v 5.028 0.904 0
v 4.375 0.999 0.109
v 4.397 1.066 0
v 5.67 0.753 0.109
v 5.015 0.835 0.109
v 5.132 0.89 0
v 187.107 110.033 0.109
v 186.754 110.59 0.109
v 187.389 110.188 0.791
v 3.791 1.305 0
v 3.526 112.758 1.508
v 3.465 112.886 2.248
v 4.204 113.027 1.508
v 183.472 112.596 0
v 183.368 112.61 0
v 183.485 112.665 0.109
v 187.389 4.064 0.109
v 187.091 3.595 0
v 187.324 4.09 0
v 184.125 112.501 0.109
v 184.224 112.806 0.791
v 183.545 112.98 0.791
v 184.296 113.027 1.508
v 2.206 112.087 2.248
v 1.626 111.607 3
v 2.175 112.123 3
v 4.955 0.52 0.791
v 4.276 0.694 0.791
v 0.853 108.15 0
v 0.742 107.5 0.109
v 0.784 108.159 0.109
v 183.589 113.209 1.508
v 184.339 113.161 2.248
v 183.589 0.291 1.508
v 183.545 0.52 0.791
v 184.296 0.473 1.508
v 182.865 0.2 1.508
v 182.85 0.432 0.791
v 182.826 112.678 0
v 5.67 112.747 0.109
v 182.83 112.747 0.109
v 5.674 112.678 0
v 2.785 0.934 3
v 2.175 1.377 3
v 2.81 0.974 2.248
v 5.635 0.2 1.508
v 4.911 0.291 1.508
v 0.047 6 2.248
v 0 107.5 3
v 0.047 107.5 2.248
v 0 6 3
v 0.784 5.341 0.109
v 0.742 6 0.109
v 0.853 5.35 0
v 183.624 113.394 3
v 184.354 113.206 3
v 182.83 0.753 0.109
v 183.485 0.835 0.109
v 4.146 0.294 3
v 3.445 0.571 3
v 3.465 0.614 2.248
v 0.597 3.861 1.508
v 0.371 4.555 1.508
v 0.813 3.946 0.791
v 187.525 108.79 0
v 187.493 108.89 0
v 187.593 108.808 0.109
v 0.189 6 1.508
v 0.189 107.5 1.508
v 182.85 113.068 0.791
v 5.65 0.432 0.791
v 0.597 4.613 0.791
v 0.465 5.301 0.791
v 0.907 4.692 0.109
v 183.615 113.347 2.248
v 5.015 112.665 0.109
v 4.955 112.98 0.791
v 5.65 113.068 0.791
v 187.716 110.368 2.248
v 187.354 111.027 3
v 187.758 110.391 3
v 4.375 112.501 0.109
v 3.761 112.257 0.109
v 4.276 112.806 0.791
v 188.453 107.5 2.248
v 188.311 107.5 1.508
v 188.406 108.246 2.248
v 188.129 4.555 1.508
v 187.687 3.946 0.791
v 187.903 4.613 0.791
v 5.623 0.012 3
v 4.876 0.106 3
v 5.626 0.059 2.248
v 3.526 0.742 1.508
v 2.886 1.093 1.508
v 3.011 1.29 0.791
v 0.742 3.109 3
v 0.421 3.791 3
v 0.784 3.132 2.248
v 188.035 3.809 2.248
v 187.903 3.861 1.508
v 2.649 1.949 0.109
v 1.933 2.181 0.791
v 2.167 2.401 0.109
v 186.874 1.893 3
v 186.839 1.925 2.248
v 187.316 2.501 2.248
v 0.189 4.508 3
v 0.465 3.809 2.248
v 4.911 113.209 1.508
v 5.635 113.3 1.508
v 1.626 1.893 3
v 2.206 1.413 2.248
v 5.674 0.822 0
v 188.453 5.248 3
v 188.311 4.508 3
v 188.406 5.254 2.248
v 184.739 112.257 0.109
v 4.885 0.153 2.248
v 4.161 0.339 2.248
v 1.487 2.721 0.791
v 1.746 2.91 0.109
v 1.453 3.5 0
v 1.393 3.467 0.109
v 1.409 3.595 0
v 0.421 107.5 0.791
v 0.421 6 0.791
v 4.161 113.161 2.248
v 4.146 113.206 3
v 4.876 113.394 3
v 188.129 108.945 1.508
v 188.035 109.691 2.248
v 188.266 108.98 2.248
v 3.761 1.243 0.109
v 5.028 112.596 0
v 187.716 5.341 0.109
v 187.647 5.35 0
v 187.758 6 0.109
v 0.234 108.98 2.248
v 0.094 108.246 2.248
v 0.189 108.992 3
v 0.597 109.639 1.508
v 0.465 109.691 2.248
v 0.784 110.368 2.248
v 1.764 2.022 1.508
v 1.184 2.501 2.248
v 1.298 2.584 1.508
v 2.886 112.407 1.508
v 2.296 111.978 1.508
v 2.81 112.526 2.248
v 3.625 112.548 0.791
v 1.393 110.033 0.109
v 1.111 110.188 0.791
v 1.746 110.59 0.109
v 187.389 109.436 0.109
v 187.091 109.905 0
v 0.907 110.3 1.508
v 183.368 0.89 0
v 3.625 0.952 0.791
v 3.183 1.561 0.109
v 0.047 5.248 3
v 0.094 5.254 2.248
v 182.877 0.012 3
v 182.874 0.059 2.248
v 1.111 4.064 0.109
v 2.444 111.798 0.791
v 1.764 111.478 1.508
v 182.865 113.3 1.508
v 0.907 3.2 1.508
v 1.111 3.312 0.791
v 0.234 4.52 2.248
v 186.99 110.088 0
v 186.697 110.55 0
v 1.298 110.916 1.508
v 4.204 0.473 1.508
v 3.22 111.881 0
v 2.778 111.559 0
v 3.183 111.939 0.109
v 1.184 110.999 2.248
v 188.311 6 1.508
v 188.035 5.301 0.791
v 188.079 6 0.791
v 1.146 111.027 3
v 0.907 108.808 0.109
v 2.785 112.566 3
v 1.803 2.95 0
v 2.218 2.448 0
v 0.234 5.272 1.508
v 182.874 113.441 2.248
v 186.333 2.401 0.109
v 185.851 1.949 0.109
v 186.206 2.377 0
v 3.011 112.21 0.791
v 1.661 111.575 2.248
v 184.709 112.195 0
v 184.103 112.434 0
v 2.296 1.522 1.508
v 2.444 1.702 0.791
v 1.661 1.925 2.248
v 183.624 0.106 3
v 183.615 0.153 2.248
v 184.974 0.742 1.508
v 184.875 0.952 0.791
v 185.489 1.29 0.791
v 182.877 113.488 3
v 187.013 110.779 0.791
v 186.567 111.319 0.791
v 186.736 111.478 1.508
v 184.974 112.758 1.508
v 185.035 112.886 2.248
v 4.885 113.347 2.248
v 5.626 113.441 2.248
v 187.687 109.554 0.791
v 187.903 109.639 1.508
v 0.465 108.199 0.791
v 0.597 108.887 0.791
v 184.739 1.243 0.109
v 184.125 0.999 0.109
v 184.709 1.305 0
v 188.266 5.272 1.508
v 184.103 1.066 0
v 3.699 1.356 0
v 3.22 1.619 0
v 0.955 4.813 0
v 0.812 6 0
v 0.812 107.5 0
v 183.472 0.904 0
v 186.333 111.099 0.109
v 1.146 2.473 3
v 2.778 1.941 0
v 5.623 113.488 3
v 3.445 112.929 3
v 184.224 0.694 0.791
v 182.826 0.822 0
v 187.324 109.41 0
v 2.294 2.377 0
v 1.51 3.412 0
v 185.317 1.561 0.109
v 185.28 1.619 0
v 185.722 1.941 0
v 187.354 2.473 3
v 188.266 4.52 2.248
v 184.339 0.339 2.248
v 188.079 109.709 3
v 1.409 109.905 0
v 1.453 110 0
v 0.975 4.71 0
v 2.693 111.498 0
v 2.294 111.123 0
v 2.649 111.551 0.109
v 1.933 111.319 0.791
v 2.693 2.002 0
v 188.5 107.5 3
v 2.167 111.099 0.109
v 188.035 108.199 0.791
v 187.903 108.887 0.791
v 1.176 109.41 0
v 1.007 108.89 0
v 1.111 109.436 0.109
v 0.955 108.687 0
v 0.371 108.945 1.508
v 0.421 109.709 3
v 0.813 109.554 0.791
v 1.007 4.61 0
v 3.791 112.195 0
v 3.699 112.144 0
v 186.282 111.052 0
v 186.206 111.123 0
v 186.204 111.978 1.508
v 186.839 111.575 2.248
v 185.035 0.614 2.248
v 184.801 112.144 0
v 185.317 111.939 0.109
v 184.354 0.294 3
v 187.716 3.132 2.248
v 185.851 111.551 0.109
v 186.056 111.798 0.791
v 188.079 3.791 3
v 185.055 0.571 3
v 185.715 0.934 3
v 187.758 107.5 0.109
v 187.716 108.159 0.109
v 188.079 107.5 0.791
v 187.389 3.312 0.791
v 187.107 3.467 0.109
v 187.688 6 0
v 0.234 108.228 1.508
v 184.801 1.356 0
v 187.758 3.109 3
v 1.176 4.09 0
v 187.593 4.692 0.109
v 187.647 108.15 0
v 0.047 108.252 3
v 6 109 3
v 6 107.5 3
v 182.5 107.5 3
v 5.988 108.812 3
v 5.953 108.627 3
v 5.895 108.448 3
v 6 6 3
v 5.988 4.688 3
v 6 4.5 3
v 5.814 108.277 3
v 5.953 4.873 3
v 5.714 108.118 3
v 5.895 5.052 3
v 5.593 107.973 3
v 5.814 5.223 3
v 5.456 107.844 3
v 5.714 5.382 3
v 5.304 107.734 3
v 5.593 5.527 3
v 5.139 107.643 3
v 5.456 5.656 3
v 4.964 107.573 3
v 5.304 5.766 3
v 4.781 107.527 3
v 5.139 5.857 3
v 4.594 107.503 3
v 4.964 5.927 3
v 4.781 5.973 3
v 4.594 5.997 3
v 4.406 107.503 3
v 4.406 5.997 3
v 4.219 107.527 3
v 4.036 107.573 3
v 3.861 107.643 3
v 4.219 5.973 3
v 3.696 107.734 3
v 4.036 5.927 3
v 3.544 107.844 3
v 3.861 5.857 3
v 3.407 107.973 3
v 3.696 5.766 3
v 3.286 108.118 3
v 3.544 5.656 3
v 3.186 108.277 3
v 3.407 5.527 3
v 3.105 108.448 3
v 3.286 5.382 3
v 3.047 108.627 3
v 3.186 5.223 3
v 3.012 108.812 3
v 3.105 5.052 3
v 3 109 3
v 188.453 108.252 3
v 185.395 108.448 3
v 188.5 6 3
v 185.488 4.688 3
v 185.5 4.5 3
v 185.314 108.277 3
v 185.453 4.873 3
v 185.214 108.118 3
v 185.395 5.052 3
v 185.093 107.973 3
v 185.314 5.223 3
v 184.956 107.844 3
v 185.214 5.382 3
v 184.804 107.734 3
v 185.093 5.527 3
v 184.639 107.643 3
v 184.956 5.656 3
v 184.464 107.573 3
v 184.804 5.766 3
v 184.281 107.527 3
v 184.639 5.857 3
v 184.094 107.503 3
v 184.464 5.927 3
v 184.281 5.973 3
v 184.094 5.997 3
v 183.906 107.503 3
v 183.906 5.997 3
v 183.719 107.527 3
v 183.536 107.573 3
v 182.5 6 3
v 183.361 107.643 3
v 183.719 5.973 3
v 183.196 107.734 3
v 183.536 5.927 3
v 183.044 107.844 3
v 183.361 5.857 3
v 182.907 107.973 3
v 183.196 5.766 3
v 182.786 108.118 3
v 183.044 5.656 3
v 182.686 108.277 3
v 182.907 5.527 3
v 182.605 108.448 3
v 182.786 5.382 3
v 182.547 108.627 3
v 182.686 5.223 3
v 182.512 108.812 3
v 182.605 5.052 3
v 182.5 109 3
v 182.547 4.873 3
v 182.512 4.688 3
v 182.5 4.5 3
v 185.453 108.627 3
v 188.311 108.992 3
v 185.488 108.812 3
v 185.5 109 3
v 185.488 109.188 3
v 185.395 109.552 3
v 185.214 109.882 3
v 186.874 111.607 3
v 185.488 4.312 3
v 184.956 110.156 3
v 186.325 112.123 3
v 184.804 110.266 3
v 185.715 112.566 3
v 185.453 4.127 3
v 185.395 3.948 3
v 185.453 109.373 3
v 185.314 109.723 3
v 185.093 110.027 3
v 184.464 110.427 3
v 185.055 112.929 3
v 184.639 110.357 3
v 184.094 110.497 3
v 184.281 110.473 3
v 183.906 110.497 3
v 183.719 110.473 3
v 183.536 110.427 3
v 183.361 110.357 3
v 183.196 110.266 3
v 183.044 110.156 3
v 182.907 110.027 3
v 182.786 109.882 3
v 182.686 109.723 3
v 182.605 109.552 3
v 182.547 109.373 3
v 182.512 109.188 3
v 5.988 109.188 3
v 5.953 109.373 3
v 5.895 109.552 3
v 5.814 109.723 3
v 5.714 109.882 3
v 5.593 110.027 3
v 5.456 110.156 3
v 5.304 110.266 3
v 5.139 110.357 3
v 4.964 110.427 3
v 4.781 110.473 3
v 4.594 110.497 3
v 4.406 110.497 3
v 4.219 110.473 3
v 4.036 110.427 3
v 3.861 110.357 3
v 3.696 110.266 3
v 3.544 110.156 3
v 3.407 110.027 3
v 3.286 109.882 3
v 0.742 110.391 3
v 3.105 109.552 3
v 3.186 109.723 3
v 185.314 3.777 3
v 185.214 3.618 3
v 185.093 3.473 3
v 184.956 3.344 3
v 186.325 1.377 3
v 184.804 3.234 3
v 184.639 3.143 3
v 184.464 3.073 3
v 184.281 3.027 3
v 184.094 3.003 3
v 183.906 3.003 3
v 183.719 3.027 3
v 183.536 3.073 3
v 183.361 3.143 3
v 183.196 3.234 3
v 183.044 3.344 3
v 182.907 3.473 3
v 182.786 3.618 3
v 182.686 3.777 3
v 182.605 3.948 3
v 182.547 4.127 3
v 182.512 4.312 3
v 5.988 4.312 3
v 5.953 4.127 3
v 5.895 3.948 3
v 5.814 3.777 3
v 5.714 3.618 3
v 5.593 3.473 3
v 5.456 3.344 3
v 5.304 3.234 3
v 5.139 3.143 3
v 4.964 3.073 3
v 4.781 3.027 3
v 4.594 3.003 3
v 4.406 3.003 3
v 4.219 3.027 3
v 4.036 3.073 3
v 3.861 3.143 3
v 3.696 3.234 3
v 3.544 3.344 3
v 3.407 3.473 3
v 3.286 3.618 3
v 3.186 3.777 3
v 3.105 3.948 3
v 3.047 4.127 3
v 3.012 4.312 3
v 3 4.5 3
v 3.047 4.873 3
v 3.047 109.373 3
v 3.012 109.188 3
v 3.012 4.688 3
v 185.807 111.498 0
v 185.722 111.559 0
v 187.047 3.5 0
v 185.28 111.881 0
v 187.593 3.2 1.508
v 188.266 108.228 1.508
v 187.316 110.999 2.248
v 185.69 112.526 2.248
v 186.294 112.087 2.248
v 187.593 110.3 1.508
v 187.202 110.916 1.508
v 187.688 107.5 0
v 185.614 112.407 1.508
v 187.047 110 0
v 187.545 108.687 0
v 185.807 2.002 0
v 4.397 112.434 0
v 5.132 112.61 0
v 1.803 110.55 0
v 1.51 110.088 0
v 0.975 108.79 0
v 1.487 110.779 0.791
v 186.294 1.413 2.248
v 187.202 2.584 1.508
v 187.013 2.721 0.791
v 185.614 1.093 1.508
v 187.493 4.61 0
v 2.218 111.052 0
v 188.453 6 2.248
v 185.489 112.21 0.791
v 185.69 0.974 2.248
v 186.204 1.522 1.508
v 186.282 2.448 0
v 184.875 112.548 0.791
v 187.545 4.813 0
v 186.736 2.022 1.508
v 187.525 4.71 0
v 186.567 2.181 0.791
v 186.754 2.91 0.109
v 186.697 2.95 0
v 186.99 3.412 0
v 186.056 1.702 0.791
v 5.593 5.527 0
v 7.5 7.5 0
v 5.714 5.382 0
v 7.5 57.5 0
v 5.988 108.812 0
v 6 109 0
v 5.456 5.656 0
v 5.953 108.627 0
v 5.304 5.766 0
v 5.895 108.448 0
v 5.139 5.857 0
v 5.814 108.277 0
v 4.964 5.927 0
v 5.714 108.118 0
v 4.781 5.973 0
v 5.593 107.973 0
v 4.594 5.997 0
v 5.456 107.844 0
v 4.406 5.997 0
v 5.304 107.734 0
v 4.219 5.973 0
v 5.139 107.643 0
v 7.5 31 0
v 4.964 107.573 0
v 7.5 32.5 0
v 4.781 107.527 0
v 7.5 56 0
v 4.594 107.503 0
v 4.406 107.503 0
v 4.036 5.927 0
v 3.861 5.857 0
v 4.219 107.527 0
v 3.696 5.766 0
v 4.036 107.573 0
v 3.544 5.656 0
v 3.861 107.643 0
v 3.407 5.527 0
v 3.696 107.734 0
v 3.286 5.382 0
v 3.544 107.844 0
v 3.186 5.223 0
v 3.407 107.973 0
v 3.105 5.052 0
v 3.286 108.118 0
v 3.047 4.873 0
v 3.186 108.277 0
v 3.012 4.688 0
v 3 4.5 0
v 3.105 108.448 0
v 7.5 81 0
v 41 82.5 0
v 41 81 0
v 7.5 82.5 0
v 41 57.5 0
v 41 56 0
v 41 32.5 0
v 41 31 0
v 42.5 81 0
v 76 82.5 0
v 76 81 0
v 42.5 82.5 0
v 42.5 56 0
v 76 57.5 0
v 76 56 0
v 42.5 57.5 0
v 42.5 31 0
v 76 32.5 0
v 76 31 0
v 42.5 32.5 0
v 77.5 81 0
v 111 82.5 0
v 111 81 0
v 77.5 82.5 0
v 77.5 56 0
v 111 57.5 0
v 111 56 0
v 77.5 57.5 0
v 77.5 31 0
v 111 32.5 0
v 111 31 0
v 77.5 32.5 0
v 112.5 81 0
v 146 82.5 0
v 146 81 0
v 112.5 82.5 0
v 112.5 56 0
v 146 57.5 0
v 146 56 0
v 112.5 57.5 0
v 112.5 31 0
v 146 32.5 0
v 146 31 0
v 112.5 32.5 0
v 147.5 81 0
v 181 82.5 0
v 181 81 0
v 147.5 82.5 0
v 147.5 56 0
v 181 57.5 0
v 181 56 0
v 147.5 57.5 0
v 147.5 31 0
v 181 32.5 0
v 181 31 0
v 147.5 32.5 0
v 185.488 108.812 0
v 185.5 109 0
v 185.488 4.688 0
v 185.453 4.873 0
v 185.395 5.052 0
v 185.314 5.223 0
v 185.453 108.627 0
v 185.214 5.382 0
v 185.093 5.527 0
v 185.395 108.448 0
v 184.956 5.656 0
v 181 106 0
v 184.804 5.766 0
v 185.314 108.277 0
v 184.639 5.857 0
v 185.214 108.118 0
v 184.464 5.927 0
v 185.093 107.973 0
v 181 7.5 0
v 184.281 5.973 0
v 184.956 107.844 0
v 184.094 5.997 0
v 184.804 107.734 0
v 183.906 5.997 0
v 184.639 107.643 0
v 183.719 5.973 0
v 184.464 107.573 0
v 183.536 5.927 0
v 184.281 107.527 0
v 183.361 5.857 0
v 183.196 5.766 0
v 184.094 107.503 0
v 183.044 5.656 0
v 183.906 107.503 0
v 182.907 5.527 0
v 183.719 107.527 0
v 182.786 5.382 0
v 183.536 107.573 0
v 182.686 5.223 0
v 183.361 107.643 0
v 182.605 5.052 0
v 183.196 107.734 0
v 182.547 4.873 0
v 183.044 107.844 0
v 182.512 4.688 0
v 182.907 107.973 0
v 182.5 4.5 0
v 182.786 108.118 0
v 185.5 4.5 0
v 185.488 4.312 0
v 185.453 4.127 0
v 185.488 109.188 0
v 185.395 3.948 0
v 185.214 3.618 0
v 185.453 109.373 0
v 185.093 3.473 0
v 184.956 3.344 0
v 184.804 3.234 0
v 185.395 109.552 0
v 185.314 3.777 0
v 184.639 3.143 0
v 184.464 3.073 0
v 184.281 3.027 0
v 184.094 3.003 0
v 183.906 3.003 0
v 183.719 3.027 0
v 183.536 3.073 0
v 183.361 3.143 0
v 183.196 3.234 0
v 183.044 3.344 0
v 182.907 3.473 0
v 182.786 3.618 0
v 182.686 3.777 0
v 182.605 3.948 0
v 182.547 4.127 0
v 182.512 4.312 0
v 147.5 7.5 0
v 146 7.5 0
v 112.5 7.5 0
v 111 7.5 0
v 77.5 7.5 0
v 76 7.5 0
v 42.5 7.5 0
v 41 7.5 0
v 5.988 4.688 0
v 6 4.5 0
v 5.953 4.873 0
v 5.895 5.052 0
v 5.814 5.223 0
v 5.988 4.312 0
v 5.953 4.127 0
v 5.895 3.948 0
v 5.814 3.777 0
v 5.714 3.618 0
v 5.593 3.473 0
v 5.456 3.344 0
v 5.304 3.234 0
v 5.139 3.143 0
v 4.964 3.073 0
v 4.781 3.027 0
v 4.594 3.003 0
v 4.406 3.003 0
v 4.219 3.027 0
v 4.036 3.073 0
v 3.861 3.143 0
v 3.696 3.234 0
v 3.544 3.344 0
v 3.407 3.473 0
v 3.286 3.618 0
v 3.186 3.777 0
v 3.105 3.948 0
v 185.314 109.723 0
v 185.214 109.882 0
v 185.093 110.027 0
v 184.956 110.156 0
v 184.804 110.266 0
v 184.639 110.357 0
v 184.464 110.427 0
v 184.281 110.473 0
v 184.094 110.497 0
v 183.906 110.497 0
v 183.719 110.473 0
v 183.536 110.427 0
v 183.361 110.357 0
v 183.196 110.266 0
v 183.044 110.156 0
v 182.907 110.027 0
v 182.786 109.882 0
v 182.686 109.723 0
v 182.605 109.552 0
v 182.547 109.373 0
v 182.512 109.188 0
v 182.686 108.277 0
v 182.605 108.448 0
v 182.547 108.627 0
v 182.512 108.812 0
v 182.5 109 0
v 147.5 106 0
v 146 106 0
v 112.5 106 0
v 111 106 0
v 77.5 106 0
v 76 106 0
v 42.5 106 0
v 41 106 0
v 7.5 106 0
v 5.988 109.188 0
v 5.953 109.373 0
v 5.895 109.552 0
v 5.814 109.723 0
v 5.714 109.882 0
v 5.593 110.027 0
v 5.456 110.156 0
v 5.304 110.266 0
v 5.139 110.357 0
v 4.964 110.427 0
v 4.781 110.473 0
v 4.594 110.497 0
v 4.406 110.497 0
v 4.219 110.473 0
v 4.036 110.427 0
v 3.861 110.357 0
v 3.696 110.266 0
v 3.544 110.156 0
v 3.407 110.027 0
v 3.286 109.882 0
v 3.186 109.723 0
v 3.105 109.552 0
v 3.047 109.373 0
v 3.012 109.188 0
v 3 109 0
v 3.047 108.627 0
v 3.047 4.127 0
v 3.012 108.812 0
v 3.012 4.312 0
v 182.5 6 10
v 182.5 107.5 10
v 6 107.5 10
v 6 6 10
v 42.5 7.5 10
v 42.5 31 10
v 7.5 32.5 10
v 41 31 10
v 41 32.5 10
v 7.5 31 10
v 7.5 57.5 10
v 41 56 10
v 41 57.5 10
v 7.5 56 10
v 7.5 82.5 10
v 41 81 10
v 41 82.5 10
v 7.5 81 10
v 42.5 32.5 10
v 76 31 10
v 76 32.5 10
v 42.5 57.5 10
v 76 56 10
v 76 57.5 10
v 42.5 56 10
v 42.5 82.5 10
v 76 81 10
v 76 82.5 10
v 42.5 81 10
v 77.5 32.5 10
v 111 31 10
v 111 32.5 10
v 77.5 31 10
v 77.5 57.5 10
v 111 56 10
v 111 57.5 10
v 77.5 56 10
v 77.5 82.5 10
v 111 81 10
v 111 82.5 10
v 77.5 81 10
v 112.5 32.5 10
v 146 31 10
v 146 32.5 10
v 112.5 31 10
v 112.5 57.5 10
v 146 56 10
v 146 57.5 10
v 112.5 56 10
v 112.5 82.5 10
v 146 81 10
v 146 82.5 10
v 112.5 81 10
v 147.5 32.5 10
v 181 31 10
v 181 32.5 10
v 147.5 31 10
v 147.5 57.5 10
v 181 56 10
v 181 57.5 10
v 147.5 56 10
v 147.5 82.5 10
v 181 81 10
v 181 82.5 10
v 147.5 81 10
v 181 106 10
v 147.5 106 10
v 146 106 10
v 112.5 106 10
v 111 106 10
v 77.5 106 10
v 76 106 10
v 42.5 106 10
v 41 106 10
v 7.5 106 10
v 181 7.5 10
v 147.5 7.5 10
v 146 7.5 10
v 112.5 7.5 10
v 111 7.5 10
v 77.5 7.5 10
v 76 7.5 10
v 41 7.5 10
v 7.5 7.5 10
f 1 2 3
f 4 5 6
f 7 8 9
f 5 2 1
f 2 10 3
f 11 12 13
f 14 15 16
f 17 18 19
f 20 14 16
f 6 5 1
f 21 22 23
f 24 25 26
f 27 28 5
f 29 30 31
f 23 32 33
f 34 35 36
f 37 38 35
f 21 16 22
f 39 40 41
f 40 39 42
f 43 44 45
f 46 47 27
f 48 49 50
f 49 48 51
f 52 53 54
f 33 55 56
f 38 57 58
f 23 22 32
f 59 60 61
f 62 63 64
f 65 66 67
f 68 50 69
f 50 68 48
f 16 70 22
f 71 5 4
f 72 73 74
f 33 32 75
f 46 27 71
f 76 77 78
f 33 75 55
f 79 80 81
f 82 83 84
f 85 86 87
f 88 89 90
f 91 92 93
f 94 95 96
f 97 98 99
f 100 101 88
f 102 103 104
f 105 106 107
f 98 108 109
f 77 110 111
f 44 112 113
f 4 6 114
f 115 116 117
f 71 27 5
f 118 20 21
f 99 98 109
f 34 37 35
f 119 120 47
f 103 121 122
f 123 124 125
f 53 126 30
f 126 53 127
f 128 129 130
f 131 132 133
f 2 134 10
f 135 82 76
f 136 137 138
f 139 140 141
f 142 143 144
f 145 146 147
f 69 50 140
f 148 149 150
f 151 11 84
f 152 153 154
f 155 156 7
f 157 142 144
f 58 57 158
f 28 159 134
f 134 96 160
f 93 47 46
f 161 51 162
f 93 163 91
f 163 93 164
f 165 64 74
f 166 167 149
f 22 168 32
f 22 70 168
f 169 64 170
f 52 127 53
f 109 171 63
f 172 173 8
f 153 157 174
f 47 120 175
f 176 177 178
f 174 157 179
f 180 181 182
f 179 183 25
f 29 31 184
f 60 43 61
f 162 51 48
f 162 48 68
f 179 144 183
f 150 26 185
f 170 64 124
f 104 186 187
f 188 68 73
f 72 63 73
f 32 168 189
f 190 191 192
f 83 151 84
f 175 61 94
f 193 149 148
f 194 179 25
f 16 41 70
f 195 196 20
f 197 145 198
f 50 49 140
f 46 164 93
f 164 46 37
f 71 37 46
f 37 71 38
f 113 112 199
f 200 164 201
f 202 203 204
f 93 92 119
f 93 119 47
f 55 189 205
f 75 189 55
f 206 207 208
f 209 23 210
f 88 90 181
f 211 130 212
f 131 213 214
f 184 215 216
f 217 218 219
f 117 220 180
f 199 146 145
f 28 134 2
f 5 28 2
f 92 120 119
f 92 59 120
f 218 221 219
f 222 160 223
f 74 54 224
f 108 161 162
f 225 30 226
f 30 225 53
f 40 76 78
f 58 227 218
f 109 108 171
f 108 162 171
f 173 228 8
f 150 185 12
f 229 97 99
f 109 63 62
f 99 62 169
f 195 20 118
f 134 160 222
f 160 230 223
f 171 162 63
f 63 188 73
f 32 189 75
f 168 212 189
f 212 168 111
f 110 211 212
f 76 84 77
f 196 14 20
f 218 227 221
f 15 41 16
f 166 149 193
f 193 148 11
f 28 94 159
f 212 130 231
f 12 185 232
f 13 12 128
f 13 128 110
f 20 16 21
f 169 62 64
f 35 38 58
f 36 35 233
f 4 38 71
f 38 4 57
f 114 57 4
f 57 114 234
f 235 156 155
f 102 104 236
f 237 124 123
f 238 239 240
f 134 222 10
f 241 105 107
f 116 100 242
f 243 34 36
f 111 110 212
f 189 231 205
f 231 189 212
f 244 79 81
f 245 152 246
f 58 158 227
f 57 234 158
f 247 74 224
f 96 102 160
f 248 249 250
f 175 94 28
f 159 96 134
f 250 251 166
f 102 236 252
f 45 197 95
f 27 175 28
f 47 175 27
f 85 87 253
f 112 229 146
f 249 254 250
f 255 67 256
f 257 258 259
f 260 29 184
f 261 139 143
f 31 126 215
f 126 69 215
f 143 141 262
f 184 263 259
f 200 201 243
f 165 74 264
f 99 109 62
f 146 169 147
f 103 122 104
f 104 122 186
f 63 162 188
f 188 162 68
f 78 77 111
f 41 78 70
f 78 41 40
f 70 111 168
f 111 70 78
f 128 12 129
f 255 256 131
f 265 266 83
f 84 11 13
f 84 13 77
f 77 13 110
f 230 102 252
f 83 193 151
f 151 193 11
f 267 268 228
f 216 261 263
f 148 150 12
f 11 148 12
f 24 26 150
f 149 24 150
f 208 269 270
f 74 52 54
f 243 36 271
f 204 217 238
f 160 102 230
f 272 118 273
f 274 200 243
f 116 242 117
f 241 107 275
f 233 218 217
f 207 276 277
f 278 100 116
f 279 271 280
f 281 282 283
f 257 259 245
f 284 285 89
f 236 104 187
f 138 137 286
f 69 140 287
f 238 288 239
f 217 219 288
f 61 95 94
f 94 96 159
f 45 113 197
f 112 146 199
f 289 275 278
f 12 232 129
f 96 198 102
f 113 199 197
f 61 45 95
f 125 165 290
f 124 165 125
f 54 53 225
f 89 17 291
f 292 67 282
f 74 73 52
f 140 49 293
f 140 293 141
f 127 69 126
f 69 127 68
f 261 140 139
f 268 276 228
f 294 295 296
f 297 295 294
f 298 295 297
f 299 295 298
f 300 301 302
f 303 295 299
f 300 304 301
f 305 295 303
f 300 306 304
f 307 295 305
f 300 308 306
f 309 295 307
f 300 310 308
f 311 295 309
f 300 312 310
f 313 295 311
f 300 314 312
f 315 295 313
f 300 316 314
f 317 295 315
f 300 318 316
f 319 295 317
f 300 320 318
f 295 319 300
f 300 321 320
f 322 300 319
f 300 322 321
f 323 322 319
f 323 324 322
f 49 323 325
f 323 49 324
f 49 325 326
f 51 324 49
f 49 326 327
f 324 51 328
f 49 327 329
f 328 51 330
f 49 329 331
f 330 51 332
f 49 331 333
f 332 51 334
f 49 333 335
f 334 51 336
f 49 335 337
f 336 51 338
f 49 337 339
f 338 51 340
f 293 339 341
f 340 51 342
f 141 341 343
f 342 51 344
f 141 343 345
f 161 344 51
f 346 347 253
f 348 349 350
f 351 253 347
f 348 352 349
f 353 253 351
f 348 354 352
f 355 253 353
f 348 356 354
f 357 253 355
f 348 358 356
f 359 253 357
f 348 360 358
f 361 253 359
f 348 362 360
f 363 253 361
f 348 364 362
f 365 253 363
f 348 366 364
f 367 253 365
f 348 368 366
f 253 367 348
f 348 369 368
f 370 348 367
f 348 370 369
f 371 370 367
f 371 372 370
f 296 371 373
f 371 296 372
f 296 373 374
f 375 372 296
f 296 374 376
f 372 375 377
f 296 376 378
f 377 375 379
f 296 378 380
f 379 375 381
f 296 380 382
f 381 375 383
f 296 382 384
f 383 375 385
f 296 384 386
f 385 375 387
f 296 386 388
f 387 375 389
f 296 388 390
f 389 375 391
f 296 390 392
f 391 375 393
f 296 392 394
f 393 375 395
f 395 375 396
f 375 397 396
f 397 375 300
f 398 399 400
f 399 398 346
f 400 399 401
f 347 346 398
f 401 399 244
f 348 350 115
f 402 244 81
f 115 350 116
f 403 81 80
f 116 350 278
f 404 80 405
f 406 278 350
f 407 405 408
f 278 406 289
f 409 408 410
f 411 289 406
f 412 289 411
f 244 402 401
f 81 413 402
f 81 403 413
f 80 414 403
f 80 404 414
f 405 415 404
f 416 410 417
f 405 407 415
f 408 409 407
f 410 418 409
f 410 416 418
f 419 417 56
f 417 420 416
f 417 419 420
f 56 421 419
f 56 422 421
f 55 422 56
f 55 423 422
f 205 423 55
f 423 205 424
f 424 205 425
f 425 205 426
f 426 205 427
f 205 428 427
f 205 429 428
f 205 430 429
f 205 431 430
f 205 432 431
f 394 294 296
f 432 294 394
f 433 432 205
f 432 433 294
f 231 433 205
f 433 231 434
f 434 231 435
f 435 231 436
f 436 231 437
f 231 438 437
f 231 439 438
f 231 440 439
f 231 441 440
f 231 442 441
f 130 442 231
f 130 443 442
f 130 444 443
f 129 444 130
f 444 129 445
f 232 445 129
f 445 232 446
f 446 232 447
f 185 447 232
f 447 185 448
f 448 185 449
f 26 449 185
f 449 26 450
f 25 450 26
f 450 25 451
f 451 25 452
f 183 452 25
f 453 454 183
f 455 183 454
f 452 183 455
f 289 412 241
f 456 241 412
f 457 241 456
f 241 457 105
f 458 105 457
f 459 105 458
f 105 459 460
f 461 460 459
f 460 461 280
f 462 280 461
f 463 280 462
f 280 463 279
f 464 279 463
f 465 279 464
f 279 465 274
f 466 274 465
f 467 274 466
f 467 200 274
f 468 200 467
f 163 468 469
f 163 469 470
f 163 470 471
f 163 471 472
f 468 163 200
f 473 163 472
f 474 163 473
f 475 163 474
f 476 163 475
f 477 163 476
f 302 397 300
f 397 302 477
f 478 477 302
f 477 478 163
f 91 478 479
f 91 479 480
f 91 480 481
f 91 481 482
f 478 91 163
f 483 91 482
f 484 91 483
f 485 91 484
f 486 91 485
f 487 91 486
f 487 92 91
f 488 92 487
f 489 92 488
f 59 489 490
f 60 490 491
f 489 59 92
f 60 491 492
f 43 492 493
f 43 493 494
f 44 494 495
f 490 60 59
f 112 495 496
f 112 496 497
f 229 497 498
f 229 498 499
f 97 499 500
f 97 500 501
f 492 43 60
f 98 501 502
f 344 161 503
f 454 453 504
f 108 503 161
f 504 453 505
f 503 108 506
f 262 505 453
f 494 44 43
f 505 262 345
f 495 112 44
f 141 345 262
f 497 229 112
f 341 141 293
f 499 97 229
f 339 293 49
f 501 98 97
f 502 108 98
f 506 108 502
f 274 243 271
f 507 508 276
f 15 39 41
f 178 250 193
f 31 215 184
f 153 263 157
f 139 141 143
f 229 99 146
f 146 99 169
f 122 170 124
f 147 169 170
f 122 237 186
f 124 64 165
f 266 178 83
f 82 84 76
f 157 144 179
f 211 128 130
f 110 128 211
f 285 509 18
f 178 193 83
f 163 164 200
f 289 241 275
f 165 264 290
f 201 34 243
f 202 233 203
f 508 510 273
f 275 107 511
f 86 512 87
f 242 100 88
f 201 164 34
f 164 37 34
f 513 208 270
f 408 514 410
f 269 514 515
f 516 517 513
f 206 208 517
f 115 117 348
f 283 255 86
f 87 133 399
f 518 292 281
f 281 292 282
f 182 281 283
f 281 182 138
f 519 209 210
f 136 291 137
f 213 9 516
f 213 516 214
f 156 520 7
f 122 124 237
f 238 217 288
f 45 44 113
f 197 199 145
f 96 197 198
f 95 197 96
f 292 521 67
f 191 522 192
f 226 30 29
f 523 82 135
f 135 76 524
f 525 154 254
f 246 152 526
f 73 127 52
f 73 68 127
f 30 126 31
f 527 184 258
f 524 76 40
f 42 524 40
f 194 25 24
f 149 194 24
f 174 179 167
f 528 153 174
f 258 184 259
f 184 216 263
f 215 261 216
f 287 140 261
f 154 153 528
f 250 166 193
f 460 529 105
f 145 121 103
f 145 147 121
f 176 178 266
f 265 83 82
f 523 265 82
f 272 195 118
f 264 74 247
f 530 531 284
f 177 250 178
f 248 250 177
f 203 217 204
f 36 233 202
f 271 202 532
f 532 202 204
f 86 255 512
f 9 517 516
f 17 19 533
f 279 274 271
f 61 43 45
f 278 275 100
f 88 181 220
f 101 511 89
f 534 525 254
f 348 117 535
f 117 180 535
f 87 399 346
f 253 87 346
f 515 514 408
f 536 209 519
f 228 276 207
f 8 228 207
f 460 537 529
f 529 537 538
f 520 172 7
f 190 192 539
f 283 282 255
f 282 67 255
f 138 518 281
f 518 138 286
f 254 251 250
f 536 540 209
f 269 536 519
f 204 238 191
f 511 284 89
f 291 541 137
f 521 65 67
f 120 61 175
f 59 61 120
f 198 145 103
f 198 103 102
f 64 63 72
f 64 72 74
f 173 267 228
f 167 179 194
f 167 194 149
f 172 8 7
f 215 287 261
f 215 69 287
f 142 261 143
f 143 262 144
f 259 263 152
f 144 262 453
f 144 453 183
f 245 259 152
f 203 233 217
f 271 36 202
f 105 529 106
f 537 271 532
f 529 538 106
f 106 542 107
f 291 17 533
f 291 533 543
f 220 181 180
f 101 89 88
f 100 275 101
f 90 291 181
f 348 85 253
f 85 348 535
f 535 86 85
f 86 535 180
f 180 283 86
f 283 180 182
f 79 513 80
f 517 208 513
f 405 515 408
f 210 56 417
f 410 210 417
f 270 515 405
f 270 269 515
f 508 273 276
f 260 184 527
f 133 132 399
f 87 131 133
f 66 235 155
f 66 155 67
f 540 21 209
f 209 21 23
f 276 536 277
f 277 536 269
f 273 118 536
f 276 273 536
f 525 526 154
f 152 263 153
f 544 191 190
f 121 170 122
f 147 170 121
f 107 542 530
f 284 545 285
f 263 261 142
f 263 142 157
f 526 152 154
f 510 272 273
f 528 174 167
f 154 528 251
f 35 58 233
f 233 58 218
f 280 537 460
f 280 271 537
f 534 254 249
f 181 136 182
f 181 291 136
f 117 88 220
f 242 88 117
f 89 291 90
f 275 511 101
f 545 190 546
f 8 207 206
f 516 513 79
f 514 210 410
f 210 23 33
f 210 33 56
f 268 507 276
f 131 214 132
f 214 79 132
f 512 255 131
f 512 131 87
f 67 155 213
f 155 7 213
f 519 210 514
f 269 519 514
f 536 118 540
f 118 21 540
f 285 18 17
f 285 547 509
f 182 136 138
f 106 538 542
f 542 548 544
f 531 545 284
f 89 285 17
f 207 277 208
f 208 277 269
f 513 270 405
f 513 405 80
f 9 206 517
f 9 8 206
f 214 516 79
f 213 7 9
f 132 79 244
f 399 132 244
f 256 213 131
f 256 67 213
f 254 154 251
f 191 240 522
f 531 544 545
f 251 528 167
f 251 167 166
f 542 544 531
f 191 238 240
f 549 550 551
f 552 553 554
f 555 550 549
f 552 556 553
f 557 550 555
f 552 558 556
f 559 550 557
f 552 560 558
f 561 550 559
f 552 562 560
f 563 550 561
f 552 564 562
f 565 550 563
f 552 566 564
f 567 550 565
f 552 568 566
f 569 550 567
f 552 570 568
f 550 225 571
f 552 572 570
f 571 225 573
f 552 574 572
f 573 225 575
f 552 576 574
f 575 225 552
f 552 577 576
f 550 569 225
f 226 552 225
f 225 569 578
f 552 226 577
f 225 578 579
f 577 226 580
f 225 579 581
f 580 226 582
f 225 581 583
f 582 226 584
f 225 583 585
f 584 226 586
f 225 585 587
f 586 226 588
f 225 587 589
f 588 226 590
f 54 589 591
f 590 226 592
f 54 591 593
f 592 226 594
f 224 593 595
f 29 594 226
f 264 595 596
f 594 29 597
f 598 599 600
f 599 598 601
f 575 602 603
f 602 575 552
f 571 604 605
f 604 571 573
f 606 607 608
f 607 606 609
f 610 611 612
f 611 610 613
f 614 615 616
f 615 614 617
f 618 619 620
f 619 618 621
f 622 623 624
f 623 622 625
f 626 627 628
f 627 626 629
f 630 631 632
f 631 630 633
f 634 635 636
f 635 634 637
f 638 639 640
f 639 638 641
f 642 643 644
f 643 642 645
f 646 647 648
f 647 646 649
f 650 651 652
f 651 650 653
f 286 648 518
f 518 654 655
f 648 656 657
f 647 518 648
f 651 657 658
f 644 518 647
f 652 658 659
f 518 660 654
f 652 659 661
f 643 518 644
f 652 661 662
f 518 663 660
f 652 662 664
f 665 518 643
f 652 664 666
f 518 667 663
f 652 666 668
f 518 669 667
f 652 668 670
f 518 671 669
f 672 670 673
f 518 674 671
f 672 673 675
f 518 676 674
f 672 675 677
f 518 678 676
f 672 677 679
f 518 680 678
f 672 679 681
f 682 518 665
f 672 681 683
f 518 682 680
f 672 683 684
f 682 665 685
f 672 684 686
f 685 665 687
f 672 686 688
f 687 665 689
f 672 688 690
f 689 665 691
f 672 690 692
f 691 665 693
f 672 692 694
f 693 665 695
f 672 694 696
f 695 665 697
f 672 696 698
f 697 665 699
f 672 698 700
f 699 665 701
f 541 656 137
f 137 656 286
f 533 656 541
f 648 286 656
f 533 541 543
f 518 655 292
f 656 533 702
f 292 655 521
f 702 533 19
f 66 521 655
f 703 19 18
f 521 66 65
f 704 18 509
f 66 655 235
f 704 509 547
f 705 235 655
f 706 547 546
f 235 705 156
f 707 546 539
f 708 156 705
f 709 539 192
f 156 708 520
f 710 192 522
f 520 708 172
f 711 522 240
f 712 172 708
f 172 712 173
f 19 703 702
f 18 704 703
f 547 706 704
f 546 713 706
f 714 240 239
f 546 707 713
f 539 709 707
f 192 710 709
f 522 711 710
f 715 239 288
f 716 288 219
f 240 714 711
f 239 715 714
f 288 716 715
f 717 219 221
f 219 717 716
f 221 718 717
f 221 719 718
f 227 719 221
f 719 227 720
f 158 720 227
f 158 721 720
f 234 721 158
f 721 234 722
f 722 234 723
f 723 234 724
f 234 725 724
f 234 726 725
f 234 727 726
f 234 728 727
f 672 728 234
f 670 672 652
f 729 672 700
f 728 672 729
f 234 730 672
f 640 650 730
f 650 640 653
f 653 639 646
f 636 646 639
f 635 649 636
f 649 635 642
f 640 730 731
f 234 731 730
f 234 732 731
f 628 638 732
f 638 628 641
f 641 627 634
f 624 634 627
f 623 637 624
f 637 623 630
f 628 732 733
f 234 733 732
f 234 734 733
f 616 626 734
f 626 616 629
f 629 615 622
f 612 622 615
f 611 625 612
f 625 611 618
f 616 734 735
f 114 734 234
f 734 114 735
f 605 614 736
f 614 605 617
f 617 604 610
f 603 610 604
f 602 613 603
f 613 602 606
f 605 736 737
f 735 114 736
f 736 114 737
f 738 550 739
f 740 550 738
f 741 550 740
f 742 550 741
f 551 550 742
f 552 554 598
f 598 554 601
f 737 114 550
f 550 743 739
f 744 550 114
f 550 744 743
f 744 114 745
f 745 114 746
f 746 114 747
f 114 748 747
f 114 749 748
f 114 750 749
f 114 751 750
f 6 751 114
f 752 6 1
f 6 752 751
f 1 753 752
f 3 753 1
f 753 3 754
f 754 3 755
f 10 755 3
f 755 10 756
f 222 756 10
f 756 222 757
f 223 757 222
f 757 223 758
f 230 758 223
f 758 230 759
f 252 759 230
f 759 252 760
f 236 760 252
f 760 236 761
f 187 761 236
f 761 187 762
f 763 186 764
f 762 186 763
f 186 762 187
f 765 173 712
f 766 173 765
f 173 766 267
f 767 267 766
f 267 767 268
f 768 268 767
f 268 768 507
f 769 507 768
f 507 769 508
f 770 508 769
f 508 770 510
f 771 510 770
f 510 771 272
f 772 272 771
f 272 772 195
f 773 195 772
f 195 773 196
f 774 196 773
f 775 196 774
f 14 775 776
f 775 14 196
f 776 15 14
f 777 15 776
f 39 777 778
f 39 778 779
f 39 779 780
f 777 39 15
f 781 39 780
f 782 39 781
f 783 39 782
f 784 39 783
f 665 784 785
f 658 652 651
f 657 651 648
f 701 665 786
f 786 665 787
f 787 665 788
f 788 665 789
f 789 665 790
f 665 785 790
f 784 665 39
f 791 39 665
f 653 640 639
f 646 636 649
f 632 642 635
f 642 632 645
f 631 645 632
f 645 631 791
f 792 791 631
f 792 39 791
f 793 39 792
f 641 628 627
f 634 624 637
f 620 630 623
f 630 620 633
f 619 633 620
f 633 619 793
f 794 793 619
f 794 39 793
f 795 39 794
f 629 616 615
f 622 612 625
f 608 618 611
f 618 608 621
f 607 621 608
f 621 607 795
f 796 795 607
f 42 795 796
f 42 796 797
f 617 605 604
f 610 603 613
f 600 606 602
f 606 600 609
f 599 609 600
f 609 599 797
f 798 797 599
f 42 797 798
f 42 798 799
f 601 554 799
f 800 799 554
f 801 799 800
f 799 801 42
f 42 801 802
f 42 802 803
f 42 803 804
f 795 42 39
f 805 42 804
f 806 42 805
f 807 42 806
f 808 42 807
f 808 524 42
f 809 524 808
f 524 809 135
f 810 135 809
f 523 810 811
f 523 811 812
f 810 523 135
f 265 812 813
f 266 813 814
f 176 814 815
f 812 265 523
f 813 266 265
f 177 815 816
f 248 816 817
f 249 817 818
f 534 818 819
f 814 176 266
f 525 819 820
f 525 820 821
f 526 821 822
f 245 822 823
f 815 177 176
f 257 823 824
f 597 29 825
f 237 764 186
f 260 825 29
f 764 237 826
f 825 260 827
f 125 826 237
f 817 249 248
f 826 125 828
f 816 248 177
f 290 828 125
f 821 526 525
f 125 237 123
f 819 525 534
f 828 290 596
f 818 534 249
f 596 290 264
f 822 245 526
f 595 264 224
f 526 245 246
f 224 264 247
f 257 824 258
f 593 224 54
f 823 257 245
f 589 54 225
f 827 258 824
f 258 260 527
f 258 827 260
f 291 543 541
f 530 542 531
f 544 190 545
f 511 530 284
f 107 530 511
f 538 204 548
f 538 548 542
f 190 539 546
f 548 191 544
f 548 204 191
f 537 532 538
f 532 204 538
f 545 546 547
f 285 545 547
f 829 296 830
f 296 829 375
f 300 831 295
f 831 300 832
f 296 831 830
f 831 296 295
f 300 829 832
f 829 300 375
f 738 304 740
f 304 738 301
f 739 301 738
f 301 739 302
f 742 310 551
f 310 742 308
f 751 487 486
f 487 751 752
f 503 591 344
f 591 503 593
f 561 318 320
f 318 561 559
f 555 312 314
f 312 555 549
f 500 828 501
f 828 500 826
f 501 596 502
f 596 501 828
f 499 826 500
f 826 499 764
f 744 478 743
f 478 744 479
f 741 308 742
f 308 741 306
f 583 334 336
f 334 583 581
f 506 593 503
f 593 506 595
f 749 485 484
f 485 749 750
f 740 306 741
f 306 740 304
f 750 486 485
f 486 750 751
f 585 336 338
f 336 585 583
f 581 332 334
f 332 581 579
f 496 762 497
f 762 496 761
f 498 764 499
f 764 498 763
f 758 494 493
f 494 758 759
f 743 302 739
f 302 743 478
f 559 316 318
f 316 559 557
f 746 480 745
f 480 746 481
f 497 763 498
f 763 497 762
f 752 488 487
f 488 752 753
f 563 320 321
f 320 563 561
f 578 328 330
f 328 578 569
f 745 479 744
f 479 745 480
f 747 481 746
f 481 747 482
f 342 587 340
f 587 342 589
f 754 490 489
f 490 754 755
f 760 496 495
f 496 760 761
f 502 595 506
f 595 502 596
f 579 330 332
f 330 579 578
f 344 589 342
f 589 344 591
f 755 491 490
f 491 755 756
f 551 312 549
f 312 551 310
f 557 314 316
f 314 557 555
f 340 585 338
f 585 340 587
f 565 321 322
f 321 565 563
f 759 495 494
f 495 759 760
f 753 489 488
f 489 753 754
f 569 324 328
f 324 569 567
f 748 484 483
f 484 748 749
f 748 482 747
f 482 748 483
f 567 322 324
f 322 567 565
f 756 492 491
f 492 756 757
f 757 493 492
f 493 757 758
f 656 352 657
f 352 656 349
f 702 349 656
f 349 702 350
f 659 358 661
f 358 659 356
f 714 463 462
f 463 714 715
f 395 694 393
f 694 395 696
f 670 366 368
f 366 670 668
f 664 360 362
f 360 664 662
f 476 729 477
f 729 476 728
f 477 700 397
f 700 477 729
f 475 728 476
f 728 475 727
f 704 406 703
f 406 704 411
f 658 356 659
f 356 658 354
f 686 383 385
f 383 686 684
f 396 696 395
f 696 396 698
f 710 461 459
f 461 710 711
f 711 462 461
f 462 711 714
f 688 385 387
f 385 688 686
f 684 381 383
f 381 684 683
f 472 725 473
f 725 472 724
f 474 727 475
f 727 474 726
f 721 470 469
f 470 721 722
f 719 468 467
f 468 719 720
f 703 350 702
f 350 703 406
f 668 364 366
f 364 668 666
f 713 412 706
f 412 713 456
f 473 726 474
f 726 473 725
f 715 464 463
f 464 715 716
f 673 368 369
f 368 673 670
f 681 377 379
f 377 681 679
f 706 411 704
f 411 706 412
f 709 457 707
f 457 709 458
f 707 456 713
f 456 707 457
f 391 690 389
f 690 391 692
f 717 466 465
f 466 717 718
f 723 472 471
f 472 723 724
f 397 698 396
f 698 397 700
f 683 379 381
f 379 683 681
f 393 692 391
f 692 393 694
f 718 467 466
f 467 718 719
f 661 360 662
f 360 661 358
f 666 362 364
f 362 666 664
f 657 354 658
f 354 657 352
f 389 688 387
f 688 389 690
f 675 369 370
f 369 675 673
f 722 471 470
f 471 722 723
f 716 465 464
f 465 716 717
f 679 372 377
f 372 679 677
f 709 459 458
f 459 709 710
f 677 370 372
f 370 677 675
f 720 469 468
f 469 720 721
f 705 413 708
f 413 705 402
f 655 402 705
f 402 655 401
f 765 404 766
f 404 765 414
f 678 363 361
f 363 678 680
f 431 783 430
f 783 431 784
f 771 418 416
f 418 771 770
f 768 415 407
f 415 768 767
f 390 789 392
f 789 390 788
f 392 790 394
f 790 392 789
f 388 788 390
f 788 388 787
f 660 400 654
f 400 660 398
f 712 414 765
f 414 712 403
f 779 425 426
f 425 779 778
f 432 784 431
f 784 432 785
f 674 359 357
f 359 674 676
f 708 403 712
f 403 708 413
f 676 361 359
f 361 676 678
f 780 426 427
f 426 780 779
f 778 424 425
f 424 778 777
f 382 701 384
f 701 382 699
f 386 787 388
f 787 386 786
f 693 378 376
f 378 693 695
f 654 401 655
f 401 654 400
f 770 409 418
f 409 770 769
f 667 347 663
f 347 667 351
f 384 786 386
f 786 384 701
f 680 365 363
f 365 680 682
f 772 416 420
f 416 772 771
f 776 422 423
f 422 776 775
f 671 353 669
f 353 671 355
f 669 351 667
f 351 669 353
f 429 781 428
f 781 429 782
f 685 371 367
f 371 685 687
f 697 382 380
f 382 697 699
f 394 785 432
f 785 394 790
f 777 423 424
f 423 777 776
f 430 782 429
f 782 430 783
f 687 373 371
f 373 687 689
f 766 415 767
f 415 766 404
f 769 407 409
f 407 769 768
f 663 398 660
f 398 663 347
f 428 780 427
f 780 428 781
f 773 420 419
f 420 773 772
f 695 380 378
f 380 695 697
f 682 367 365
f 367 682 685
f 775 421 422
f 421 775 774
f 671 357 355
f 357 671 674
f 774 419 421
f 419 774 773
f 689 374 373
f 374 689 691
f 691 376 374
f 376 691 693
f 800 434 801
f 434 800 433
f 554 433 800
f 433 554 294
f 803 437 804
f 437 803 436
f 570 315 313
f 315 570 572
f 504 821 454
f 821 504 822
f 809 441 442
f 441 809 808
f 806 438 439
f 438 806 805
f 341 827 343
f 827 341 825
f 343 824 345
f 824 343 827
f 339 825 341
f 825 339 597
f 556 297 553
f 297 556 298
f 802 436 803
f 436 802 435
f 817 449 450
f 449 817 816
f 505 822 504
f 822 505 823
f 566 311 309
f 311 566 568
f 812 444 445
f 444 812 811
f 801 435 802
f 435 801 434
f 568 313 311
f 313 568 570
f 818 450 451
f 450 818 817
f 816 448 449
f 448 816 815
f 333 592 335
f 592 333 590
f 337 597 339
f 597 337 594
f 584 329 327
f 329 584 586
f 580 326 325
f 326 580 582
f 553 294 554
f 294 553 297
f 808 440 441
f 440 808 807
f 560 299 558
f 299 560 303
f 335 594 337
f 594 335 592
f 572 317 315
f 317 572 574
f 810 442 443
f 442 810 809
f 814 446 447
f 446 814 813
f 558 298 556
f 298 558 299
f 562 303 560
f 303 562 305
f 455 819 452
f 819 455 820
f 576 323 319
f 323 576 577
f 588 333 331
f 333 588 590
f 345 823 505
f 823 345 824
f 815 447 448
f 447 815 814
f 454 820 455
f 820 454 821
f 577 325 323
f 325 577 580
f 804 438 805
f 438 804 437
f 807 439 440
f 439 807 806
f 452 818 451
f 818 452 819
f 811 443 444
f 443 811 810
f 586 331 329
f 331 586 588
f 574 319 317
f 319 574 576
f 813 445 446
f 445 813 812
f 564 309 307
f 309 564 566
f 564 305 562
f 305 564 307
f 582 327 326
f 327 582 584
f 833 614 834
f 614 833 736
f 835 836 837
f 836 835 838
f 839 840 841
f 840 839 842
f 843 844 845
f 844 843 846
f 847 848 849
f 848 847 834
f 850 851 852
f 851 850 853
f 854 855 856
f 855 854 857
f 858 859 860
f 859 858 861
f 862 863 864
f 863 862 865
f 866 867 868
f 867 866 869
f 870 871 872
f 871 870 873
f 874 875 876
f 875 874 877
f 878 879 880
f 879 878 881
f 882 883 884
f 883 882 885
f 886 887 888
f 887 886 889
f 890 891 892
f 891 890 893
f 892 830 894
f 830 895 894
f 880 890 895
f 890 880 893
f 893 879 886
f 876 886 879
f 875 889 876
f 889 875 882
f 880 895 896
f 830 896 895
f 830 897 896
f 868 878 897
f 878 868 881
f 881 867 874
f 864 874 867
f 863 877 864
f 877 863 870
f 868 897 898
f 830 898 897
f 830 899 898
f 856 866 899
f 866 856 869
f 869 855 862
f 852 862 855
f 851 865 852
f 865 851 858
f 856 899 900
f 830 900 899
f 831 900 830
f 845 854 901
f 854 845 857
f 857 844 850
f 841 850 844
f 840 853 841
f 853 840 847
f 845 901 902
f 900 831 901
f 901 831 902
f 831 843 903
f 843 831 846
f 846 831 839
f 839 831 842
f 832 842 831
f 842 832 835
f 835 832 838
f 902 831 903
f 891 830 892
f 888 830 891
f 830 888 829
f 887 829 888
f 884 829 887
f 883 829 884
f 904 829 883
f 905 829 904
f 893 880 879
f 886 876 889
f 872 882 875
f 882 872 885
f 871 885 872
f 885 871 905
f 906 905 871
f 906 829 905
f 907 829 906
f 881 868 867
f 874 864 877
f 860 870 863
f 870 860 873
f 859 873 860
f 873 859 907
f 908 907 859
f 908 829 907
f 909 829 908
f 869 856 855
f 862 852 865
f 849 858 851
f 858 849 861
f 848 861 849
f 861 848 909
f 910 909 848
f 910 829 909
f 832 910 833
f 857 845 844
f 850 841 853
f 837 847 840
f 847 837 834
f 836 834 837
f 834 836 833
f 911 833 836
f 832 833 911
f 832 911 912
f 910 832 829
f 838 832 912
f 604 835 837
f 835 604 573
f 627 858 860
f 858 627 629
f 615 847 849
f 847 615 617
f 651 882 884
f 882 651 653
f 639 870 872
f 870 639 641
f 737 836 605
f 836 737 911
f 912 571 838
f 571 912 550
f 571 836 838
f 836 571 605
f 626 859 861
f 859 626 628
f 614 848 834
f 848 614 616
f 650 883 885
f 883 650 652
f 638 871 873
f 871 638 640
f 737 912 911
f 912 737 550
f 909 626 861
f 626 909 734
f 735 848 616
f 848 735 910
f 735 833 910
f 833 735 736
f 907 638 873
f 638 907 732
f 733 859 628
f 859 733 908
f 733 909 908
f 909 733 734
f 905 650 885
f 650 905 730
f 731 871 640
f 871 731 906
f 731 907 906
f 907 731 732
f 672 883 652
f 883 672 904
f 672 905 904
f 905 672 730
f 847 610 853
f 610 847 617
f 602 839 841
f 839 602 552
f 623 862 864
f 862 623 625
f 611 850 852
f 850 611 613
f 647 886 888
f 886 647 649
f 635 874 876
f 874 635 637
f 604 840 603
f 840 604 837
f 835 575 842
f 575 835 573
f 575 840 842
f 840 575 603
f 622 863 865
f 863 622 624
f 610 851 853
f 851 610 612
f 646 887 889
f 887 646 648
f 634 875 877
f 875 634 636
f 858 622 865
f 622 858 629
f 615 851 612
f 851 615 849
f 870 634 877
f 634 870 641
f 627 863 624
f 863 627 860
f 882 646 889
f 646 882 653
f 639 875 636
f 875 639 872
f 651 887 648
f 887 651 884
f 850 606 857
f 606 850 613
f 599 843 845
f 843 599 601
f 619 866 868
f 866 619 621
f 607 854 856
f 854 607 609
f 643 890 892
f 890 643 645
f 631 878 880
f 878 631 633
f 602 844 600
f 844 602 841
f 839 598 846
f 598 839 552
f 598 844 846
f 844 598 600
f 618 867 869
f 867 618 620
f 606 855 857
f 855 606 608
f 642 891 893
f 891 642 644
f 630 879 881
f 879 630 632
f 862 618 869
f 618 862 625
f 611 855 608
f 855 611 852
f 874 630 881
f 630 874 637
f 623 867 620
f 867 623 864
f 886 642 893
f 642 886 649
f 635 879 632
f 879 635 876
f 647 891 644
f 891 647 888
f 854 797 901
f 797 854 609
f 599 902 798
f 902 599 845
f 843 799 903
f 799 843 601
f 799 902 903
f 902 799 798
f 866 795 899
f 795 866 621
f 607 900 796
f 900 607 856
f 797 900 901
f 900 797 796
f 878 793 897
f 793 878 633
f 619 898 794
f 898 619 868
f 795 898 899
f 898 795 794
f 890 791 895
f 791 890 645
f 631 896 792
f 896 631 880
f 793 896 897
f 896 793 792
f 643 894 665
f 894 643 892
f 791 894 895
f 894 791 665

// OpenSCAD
// file: face-plate.scad
module truncated_hemisphere(thickness)
{
	r = 2 * thickness;
	difference() {
		translate(v = [0, 0, thickness])
			sphere(r);
		translate(v = [0, 0, -r])
			cube(size = [2 * r, 2 * r, 2 * r], center = true);
		translate(v = [0, 0, 3 * thickness])
			cube(size = [2 * r, 2 * r, 2 * r], center = true);
	}
}

module face_plate(width, height, thickness)
{
	r = 2 * thickness;
	hull() {
		translate(v = [r, r, 0])
			truncated_hemisphere(r / 2);
		translate(v = [width - r, r, 0])
			truncated_hemisphere(r / 2);
		translate(v = [width - r, height - r, 0])
			truncated_hemisphere(r / 2);
		translate(v = [r, height - r, 0])
			truncated_hemisphere(r / 2);
	}
}
// file: large-switch-array-holder.scad
include <face-plate.scad>

$fn = 50;

/* Set rows and cols before including this file */
/*
rows = 2;
cols = 2;
*/

clearance = 0.5;
width = 33 + clearance;
height = 23 + clearance;
depth = 10;
outer_width = width + 3;
outer_height = height + 3;
edge_width = 6;

module switch_holder_screw_hole()
{
	translate(v = [0, 0, -1])
		cylinder(r1 = 1.5, r2 = 1.5, h = 10);
}

module switch_holder()
{
	translate(v = [0.5 * outer_width, 0.5 * outer_height, 0.5 * depth])
		difference() {
			cube(size = [outer_width, outer_height, depth], center = true);
			cube(size = [width, height, depth + 5], center = true);
		}
}

module switch_holder_array(r, c)
{
	union() {
		for (i = [0 : 1 : r - 1]) {
			translate(v = [0, (height + 1.5) * i, 0]) {
				for (j = [0 : 1 : c - 1]) {
					translate(v = [(width + 1.5) * j, 0, 0]) {
						switch_holder();
					}
				}
			}
		}
	}
}

module switch_holder_face_plate(r, c)
{
	w = c * (width + 1.5) + 1.5;
	h = r * (height + 1.5) + 1.5;
	thickness = 3;

	difference() {
		face_plate(w + 2 * edge_width, h + 2 * edge_width, 3);
		translate(v = [edge_width, edge_width, -3]) {
			cube(size = [w, h, 10]);
		}
		translate(v = [0.75 * edge_width, 0.75 * edge_width, 0])
			switch_holder_screw_hole();
		translate(v = [w + 1.25 * edge_width, 0.75 * edge_width, 0])
			switch_holder_screw_hole();
		translate(v = [w + 1.25 * edge_width, h + 1.25 * edge_width, 0])
			switch_holder_screw_hole();
		translate(v = [0.75 * edge_width, h + 1.25 * edge_width, 0])
			switch_holder_screw_hole();
	}
}

union() {
	switch_holder_face_plate(rows, cols);
	translate(v = [edge_width, edge_width, 0])
		switch_holder_array(rows, cols);
}
// main file
rows=4;
cols=5;

include <large-switch-array-holder.scad>
